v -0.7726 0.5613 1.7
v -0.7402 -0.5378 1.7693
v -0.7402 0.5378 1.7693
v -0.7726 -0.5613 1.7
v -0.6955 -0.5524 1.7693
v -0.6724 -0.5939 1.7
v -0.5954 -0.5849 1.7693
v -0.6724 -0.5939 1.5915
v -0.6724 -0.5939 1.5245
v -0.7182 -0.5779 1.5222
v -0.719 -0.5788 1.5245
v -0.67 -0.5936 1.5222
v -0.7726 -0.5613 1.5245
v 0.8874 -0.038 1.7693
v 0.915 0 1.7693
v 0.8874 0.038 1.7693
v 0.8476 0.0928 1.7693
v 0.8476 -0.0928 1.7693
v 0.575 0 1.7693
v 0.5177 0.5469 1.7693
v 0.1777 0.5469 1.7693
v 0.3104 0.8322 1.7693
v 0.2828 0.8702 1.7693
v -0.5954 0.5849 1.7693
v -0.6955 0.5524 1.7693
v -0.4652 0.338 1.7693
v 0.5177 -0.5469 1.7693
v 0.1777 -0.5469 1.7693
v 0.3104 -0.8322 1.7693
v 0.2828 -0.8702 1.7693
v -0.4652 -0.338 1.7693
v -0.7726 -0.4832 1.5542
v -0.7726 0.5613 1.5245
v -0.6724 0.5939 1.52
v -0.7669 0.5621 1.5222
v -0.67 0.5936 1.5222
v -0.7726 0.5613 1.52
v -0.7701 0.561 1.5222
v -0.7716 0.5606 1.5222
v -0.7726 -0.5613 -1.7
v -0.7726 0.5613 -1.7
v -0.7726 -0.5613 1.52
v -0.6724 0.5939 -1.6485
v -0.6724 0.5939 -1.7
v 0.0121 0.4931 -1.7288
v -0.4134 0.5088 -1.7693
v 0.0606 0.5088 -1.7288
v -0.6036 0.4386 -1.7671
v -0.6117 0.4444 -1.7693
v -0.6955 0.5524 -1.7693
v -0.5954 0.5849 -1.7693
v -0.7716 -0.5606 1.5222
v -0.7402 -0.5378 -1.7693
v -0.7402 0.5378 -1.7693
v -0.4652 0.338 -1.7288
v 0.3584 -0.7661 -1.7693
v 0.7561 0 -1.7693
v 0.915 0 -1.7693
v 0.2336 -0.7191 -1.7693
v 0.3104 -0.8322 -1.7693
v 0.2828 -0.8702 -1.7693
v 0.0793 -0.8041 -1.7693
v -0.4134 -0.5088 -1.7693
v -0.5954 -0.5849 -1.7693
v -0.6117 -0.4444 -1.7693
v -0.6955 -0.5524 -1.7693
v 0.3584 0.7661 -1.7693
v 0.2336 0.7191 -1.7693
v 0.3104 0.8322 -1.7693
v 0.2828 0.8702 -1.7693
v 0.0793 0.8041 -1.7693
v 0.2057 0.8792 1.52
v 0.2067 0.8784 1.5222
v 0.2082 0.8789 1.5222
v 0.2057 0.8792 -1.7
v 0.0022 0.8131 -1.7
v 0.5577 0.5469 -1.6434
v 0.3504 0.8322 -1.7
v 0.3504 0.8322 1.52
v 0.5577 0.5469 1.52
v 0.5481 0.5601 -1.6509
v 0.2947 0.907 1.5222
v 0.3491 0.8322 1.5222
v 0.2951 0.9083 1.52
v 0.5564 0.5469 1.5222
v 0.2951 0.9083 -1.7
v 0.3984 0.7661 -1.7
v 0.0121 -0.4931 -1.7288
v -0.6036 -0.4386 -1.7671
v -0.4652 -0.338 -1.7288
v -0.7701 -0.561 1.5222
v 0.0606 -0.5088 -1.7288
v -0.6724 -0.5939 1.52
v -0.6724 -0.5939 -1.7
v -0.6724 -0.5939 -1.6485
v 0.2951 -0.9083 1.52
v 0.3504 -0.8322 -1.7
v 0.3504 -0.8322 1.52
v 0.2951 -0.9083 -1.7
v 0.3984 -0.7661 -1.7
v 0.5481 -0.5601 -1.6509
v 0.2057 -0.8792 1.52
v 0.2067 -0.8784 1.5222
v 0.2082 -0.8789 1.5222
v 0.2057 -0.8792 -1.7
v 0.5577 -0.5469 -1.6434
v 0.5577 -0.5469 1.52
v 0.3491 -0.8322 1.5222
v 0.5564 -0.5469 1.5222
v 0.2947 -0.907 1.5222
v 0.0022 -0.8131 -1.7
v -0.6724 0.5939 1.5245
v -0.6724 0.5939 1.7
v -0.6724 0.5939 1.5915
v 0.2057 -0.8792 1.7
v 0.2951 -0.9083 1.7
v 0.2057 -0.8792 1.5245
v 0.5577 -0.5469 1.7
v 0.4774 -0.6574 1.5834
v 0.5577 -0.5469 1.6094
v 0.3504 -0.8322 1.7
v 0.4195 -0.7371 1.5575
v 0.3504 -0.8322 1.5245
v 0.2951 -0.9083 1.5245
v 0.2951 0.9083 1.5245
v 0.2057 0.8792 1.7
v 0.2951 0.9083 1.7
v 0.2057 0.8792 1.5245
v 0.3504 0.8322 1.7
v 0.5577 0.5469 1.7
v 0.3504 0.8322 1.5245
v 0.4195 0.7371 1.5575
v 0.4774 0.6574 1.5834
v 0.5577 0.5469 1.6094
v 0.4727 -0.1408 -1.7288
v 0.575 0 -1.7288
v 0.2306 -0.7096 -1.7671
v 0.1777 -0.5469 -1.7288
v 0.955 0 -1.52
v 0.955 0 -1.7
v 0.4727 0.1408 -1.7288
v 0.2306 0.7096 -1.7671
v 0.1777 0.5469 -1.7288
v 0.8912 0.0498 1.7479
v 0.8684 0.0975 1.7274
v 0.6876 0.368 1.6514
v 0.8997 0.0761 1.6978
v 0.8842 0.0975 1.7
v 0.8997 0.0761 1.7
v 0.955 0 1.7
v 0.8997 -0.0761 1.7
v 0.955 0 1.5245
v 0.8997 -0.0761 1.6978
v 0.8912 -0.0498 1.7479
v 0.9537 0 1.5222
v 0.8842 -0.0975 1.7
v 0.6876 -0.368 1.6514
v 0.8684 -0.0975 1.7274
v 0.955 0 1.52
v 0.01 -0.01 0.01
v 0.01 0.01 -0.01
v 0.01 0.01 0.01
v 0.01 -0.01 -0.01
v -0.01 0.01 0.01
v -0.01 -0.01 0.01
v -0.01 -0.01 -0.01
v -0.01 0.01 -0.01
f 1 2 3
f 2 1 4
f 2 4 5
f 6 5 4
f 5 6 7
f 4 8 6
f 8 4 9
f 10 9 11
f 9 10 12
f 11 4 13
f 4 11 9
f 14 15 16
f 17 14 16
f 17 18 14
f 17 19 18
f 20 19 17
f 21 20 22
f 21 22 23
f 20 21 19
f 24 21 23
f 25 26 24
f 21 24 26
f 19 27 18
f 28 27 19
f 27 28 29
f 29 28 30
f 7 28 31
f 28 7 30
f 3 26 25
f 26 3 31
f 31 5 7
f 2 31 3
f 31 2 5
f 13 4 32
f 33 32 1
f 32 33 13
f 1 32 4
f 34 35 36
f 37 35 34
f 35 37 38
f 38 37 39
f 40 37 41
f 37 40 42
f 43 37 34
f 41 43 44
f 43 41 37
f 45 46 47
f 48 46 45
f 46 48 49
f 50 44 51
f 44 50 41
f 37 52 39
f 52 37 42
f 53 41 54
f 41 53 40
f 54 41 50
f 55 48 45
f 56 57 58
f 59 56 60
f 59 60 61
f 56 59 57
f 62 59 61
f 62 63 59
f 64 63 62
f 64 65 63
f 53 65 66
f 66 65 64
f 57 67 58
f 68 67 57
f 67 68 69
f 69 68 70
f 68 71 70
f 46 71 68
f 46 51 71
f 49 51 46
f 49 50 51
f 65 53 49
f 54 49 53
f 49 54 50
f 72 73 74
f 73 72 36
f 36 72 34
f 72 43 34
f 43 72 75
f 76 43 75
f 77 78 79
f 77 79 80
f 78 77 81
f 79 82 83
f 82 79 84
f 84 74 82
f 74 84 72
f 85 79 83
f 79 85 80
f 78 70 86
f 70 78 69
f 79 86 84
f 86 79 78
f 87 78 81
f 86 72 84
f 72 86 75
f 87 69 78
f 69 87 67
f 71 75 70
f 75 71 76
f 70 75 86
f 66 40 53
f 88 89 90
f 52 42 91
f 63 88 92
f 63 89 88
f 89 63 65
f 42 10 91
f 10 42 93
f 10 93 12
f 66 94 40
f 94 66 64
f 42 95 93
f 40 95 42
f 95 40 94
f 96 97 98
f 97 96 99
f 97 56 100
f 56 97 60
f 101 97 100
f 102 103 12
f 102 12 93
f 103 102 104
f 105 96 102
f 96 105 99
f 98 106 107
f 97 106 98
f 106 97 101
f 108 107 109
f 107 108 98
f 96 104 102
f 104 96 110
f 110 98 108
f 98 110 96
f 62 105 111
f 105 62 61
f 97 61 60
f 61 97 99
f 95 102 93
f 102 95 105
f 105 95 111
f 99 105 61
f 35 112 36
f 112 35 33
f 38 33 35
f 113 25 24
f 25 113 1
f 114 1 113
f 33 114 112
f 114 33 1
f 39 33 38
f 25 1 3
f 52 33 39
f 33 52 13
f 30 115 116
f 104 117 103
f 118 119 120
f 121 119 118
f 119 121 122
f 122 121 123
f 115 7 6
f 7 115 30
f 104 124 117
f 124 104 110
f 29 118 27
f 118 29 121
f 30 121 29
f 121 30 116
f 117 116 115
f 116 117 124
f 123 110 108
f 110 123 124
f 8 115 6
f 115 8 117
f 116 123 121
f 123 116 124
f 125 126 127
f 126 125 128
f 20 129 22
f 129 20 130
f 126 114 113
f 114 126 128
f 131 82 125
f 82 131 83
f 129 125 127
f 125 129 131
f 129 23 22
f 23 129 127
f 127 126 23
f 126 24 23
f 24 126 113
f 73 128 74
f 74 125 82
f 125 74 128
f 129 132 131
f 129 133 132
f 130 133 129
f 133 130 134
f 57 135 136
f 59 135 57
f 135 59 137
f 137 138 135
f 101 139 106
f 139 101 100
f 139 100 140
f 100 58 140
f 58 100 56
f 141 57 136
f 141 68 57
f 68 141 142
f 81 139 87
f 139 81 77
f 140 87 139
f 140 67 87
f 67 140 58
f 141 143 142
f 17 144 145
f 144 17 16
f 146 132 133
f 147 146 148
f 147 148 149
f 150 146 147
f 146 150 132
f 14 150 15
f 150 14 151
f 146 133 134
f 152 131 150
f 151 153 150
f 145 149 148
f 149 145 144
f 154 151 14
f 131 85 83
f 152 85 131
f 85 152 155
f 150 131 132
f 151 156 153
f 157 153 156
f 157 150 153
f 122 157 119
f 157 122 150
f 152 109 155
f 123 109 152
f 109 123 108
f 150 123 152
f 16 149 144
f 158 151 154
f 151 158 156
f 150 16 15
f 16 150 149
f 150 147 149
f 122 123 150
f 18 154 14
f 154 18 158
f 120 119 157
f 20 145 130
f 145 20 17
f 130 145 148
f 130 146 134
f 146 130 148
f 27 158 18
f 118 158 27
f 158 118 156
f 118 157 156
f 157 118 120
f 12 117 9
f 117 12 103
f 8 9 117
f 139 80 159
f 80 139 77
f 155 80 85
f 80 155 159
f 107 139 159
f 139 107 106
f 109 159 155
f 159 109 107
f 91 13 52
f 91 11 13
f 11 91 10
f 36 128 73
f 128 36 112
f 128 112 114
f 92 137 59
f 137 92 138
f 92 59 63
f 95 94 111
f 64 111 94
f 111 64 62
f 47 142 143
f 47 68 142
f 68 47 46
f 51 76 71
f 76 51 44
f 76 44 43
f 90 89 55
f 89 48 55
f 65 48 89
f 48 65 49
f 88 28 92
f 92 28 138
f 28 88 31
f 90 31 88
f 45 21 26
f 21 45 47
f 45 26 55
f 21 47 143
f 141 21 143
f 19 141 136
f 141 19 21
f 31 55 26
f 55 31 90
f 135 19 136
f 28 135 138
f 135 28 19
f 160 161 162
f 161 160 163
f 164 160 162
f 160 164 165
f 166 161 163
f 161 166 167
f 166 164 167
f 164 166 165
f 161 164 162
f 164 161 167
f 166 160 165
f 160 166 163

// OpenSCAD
// Parameters
L = 3.4; //[1.7:6.8:0.1]
OD = 1.75; //[0.9:3.5:0.05]
t = 0.3; //[0.15:0.6:0.05]
ID = 1.15; //[0.5:2.8:0.05]
overlap = 0.6; //[0.2:1.2:0.1]
chamfer = 0.2; //[0.05:0.4:0.05]
fillet_r = 0.08; //[0.02:0.2:0.01]
eps = 0.02; //[0.01:0.1:0.01]

// Base Shapes
module axial_body() {
  translate([0, 0, 0])
    cylinder(h=L, r=OD/2, center=true);
}

module inner_bore() {
  translate([0, 0, 0])
    cylinder(h=L + 2*overlap, r=ID/2, center=true);
}

module end_chamfer_top() {
  translate([0, 0, L/2 - chamfer/2 + eps])
    cylinder(h=chamfer, r1=OD/2 + eps, r2=0, center=true);
}

module end_chamfer_bottom() {
  translate([0, 0, -L/2 + chamfer/2 - eps])
    cylinder(h=chamfer, r1=OD/2 + eps, r2=0, center=true);
}

module fillet_sphere() {
  translate([0, 0, 0])
    sphere(r=fillet_r, center=true);
}

module markings() {
  translate([0, 0, 0])
    cube([eps, eps, eps], center=true);
}

// Operations
module sleeve_raw() {
  difference() {
    axial_body();
    inner_bore();
  }
}

module sleeve_chamfered() {
  difference() {
    sleeve_raw();
    end_chamfer_top();
    end_chamfer_bottom();
  }
}

module sleeve_fillet_pre() {
  minkowski() {
    sleeve_chamfered();
    fillet_sphere();
  }
}

module sleeve_fillet_trim() {
  difference() {
    sleeve_fillet_pre();
    inner_bore();
  }
}

module final_model() {
  union() {
    sleeve_fillet_trim();
    markings();
  }
}

// Final Output
final_model();
